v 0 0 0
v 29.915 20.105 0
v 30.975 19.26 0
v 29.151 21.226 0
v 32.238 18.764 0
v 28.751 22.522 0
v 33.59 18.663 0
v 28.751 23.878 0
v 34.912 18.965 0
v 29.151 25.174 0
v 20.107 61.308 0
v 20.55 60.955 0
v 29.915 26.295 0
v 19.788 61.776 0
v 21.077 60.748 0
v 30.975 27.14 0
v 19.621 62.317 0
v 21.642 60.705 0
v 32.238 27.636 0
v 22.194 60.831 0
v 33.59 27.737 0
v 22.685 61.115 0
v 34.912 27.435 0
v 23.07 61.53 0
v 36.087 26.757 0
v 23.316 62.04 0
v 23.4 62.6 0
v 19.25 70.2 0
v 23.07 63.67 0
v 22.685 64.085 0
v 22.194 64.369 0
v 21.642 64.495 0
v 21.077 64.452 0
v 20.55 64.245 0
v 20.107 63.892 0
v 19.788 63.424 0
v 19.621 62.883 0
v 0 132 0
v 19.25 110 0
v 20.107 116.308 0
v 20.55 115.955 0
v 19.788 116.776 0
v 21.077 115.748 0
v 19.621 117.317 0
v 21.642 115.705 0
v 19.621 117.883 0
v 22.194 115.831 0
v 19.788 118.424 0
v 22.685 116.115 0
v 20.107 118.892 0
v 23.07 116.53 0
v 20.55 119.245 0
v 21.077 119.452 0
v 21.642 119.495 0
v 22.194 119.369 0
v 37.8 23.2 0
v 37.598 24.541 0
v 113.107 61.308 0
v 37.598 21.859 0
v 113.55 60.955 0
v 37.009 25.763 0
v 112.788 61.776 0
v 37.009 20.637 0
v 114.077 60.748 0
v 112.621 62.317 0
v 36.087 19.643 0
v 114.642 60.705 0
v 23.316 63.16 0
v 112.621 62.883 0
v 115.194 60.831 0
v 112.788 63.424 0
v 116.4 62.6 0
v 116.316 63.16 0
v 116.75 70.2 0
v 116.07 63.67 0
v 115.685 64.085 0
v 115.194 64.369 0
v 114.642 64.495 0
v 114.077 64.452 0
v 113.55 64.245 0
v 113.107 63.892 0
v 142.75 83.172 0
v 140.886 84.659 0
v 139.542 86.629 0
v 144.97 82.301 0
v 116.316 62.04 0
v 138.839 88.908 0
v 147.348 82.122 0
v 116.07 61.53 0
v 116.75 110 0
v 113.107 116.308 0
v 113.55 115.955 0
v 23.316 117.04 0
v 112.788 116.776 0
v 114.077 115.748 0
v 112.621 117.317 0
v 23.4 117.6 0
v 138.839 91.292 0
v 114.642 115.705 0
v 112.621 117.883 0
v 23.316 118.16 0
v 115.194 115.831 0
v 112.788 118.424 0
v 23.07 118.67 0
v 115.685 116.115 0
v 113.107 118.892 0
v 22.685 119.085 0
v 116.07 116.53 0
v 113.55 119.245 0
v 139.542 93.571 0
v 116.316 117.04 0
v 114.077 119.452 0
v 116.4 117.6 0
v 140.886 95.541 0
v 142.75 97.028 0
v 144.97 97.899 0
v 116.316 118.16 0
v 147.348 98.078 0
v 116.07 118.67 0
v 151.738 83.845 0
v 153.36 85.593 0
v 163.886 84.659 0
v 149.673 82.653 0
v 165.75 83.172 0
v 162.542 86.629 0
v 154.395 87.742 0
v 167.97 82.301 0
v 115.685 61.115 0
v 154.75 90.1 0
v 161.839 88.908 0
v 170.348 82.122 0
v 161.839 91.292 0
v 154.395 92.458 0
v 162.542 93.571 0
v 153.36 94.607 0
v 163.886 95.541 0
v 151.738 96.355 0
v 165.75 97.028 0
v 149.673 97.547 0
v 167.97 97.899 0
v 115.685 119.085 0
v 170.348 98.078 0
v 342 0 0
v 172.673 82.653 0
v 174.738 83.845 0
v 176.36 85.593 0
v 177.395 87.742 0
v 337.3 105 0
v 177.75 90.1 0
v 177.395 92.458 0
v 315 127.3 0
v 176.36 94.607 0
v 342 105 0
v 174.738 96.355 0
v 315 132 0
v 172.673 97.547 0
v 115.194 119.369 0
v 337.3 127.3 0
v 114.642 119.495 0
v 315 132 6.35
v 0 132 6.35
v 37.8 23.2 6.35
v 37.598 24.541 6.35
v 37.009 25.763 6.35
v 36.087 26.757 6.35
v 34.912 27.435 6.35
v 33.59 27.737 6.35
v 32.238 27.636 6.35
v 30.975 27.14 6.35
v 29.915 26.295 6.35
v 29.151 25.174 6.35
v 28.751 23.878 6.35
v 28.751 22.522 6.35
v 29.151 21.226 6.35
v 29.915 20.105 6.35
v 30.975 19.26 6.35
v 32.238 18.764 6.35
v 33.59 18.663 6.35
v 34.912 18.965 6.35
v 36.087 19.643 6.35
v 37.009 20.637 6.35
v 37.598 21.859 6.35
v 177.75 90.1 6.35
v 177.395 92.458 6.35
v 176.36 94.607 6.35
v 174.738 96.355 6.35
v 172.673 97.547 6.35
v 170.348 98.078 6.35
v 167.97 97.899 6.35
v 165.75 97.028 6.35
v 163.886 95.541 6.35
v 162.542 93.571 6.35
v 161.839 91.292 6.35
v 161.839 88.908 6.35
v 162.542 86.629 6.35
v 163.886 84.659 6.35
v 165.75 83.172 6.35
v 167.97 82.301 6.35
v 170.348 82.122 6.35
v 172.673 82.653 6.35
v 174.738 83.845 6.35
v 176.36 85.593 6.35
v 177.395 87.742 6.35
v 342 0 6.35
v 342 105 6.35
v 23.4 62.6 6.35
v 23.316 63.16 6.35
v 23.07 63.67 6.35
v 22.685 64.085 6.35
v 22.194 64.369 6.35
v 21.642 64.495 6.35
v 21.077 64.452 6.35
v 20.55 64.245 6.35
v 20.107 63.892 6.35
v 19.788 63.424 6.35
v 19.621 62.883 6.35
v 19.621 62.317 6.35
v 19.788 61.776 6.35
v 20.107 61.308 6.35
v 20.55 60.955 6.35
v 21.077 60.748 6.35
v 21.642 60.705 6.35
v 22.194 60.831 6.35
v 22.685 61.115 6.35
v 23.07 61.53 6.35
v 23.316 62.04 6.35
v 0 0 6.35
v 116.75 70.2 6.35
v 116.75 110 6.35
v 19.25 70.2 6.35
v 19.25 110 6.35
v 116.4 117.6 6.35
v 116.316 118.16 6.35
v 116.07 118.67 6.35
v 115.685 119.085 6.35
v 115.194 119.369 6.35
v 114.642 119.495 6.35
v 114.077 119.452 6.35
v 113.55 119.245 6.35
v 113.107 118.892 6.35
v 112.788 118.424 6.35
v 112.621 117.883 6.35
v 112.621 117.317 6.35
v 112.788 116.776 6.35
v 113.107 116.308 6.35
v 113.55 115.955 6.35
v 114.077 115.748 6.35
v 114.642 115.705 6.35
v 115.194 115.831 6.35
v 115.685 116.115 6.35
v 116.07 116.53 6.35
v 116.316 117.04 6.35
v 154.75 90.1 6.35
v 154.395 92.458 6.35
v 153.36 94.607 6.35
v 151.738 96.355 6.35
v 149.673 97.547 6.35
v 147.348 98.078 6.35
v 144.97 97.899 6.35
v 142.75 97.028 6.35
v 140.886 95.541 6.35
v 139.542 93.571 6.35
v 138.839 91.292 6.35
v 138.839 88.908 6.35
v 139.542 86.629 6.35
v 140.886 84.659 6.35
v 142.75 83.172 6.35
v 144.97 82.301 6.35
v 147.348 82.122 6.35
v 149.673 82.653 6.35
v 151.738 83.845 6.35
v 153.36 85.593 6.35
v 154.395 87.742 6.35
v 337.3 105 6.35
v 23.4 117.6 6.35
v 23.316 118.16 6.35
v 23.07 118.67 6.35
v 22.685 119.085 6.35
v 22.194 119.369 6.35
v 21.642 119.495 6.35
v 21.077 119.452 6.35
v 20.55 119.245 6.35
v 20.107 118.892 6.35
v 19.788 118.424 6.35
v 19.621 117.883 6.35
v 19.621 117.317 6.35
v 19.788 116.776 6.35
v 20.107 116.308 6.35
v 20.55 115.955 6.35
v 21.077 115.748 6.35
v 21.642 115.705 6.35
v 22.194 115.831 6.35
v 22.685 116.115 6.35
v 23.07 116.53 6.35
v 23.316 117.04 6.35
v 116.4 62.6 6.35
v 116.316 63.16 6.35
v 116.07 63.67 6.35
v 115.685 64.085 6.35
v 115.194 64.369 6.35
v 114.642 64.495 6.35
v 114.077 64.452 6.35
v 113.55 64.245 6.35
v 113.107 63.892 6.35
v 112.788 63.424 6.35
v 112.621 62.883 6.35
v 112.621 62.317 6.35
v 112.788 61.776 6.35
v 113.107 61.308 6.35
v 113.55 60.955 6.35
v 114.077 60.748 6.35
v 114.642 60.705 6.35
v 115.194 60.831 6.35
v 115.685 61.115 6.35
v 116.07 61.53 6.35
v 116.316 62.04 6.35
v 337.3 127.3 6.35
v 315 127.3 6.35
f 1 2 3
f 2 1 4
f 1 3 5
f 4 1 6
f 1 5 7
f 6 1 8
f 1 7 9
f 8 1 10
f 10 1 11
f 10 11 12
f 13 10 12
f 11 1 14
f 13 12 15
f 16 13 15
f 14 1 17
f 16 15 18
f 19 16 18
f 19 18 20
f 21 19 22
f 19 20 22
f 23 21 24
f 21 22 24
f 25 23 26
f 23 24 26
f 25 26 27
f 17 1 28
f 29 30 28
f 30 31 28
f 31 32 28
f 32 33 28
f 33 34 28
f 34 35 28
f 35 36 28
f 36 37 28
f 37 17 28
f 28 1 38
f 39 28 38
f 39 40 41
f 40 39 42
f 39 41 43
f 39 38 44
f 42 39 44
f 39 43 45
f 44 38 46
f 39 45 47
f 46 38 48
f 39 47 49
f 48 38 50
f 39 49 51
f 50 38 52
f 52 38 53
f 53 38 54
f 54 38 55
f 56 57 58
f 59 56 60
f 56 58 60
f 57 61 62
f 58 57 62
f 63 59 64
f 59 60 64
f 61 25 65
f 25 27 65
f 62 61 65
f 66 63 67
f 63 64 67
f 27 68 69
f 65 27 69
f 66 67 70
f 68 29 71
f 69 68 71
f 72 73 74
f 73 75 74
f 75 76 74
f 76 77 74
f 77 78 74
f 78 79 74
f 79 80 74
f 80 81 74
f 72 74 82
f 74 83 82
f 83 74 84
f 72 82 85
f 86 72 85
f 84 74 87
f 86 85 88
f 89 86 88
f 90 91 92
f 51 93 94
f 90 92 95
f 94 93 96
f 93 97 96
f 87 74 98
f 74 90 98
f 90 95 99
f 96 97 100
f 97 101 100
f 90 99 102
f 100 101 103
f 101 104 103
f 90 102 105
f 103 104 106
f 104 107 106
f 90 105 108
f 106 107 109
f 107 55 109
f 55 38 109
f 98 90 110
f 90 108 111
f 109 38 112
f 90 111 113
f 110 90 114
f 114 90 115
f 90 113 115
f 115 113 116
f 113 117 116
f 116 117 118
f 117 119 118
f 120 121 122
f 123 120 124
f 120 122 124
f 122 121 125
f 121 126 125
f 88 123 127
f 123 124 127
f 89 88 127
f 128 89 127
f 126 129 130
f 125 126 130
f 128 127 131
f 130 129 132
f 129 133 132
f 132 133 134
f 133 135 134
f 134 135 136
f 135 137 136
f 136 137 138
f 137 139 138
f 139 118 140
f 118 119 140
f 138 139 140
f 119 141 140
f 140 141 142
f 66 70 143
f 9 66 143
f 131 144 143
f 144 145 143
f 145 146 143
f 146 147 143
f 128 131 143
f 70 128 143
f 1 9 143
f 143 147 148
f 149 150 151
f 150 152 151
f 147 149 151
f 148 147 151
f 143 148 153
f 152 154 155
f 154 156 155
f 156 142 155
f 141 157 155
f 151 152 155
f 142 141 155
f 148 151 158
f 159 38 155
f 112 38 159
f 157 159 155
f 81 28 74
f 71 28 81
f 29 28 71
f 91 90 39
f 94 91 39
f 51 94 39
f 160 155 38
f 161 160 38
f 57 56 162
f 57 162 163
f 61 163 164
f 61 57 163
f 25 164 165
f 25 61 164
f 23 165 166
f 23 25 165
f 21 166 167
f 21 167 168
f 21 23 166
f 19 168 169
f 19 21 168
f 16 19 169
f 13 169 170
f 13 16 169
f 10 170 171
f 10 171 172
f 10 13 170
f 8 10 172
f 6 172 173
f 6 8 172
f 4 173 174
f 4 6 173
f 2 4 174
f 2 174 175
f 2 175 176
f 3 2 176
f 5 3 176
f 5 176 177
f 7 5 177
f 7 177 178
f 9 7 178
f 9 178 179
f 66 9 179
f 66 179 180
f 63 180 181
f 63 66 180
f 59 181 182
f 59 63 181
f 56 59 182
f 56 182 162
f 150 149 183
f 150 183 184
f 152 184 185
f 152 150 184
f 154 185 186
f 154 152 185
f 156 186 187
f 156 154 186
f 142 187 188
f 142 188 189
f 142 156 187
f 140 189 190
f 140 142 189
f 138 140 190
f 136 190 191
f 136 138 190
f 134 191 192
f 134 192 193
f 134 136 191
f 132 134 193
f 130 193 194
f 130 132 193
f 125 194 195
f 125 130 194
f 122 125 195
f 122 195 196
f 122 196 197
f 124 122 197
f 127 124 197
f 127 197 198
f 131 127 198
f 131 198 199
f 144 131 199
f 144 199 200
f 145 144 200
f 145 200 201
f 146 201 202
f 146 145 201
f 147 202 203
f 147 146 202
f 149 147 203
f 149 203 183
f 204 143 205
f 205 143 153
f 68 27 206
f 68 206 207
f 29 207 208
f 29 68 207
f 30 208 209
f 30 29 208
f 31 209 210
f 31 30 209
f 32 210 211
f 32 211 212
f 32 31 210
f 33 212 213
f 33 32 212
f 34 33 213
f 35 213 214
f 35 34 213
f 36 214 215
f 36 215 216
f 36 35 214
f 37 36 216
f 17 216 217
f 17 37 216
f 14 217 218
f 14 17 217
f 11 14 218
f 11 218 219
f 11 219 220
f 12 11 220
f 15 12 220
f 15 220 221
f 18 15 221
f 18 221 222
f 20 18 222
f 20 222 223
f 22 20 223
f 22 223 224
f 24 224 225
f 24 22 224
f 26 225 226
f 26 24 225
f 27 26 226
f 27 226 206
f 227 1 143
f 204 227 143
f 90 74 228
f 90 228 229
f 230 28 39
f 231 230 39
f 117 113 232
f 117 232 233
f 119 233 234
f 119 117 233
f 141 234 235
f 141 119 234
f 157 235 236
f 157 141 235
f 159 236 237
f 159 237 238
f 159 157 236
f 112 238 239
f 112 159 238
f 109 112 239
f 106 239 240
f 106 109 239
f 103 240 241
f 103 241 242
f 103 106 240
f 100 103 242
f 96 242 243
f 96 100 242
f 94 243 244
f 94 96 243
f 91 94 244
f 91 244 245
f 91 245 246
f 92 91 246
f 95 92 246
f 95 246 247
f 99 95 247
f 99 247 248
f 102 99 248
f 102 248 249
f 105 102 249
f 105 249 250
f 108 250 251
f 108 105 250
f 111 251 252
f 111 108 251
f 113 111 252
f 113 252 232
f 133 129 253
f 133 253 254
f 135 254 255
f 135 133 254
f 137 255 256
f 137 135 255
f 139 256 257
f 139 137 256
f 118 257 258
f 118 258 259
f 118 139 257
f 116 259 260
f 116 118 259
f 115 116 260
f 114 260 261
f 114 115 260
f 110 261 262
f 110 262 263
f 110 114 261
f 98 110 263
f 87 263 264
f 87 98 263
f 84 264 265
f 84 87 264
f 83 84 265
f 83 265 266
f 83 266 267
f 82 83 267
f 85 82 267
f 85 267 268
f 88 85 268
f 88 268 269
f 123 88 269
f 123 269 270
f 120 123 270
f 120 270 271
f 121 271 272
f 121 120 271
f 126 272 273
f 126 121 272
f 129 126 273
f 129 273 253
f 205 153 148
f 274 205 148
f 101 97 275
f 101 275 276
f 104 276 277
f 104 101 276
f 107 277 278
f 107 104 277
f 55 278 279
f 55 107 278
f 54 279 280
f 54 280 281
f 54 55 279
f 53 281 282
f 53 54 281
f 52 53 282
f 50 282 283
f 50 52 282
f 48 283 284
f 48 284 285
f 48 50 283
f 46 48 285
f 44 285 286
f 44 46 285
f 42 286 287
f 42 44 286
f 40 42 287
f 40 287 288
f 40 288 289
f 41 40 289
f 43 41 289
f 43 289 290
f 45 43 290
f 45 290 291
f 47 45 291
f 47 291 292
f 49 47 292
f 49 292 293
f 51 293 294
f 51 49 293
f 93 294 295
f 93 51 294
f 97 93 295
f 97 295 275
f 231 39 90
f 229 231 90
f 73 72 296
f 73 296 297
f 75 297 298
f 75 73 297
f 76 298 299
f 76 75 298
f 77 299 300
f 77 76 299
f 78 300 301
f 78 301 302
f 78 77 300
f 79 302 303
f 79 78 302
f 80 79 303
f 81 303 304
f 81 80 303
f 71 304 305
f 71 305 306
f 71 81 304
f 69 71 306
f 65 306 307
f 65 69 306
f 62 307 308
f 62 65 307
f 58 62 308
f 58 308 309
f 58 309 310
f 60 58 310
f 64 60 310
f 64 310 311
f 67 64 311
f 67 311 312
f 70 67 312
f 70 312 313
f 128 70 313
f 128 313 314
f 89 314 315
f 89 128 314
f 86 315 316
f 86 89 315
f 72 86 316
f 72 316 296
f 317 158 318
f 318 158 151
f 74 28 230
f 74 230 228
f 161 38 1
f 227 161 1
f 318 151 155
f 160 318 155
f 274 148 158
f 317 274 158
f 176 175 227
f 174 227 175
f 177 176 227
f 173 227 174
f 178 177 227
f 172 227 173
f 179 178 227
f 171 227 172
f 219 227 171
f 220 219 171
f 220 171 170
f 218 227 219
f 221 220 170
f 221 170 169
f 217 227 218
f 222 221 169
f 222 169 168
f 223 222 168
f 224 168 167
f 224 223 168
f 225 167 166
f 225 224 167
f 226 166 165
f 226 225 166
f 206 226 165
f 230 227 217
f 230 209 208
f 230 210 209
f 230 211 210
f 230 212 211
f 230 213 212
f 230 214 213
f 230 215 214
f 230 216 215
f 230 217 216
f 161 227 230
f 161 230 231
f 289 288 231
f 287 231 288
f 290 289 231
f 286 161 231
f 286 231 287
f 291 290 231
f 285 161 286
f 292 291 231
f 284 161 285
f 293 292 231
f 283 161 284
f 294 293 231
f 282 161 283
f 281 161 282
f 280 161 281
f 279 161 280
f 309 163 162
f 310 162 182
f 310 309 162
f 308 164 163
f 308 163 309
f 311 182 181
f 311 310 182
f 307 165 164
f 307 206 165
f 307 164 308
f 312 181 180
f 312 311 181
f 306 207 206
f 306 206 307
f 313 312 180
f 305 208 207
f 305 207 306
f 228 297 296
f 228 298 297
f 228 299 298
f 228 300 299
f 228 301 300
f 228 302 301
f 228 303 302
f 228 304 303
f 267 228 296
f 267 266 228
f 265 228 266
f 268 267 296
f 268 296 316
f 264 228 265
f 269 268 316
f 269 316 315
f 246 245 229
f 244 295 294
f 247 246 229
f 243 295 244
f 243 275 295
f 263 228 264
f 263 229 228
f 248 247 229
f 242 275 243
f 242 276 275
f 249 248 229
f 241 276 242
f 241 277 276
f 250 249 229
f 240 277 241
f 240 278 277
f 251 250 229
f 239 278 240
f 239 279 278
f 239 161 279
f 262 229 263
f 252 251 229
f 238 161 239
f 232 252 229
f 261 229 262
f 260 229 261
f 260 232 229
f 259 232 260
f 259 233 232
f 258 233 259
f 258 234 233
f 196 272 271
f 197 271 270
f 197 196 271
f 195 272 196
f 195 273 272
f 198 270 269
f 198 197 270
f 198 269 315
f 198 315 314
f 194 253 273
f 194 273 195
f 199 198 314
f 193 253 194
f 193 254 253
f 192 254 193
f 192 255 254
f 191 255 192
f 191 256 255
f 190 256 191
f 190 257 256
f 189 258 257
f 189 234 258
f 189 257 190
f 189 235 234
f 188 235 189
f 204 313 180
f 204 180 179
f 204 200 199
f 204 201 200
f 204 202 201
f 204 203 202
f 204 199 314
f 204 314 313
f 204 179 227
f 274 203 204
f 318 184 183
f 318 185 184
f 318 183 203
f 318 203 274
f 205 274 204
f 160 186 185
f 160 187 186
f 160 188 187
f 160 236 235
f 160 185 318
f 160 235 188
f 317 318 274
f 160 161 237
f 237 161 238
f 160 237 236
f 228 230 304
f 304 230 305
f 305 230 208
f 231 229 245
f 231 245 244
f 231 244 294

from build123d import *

# Parameters (mm, degrees)
SKETCH1_R           = 1.9
SKETCH1_R_2         = 8
SKETCH1_R_3         = 4.55
SKETCH1_W           = 97.5
SKETCH1_H           = 39.8
BOSS_EXTRUDE1_DEPTH = 6.35


with BuildPart() as part:
    # Sketch1 → Boss-Extrude1 (new body)
    with BuildSketch(Plane.XY):
        Polygon((0, 0), (342, 0), (342, 105), (337.3, 105), (337.3, 127.3), (315, 127.3), (315, 132), (0, 132), align=None)
        with Locations((114.499995121, 117.600002885)):
            Circle(SKETCH1_R, mode=Mode.SUBTRACT)
        with Locations((114.499995121, 62.6)):
            Circle(SKETCH1_R, mode=Mode.SUBTRACT)
        with Locations((21.499995121, 62.6)):
            Circle(SKETCH1_R, mode=Mode.SUBTRACT)
        with Locations((21.499995121, 117.600002885)):
            Circle(SKETCH1_R, mode=Mode.SUBTRACT)
        with Locations((146.75, 90.1)):
            Circle(SKETCH1_R_2, mode=Mode.SUBTRACT)
        with Locations((169.75, 90.1)):
            Circle(SKETCH1_R_2, mode=Mode.SUBTRACT)
        with Locations((33.25, 23.2)):
            Circle(SKETCH1_R_3, mode=Mode.SUBTRACT)
        with Locations((68, 90.1)):
            Rectangle(SKETCH1_W, SKETCH1_H, mode=Mode.SUBTRACT)
    extrude(amount=BOSS_EXTRUDE1_DEPTH)


solid = part.part
